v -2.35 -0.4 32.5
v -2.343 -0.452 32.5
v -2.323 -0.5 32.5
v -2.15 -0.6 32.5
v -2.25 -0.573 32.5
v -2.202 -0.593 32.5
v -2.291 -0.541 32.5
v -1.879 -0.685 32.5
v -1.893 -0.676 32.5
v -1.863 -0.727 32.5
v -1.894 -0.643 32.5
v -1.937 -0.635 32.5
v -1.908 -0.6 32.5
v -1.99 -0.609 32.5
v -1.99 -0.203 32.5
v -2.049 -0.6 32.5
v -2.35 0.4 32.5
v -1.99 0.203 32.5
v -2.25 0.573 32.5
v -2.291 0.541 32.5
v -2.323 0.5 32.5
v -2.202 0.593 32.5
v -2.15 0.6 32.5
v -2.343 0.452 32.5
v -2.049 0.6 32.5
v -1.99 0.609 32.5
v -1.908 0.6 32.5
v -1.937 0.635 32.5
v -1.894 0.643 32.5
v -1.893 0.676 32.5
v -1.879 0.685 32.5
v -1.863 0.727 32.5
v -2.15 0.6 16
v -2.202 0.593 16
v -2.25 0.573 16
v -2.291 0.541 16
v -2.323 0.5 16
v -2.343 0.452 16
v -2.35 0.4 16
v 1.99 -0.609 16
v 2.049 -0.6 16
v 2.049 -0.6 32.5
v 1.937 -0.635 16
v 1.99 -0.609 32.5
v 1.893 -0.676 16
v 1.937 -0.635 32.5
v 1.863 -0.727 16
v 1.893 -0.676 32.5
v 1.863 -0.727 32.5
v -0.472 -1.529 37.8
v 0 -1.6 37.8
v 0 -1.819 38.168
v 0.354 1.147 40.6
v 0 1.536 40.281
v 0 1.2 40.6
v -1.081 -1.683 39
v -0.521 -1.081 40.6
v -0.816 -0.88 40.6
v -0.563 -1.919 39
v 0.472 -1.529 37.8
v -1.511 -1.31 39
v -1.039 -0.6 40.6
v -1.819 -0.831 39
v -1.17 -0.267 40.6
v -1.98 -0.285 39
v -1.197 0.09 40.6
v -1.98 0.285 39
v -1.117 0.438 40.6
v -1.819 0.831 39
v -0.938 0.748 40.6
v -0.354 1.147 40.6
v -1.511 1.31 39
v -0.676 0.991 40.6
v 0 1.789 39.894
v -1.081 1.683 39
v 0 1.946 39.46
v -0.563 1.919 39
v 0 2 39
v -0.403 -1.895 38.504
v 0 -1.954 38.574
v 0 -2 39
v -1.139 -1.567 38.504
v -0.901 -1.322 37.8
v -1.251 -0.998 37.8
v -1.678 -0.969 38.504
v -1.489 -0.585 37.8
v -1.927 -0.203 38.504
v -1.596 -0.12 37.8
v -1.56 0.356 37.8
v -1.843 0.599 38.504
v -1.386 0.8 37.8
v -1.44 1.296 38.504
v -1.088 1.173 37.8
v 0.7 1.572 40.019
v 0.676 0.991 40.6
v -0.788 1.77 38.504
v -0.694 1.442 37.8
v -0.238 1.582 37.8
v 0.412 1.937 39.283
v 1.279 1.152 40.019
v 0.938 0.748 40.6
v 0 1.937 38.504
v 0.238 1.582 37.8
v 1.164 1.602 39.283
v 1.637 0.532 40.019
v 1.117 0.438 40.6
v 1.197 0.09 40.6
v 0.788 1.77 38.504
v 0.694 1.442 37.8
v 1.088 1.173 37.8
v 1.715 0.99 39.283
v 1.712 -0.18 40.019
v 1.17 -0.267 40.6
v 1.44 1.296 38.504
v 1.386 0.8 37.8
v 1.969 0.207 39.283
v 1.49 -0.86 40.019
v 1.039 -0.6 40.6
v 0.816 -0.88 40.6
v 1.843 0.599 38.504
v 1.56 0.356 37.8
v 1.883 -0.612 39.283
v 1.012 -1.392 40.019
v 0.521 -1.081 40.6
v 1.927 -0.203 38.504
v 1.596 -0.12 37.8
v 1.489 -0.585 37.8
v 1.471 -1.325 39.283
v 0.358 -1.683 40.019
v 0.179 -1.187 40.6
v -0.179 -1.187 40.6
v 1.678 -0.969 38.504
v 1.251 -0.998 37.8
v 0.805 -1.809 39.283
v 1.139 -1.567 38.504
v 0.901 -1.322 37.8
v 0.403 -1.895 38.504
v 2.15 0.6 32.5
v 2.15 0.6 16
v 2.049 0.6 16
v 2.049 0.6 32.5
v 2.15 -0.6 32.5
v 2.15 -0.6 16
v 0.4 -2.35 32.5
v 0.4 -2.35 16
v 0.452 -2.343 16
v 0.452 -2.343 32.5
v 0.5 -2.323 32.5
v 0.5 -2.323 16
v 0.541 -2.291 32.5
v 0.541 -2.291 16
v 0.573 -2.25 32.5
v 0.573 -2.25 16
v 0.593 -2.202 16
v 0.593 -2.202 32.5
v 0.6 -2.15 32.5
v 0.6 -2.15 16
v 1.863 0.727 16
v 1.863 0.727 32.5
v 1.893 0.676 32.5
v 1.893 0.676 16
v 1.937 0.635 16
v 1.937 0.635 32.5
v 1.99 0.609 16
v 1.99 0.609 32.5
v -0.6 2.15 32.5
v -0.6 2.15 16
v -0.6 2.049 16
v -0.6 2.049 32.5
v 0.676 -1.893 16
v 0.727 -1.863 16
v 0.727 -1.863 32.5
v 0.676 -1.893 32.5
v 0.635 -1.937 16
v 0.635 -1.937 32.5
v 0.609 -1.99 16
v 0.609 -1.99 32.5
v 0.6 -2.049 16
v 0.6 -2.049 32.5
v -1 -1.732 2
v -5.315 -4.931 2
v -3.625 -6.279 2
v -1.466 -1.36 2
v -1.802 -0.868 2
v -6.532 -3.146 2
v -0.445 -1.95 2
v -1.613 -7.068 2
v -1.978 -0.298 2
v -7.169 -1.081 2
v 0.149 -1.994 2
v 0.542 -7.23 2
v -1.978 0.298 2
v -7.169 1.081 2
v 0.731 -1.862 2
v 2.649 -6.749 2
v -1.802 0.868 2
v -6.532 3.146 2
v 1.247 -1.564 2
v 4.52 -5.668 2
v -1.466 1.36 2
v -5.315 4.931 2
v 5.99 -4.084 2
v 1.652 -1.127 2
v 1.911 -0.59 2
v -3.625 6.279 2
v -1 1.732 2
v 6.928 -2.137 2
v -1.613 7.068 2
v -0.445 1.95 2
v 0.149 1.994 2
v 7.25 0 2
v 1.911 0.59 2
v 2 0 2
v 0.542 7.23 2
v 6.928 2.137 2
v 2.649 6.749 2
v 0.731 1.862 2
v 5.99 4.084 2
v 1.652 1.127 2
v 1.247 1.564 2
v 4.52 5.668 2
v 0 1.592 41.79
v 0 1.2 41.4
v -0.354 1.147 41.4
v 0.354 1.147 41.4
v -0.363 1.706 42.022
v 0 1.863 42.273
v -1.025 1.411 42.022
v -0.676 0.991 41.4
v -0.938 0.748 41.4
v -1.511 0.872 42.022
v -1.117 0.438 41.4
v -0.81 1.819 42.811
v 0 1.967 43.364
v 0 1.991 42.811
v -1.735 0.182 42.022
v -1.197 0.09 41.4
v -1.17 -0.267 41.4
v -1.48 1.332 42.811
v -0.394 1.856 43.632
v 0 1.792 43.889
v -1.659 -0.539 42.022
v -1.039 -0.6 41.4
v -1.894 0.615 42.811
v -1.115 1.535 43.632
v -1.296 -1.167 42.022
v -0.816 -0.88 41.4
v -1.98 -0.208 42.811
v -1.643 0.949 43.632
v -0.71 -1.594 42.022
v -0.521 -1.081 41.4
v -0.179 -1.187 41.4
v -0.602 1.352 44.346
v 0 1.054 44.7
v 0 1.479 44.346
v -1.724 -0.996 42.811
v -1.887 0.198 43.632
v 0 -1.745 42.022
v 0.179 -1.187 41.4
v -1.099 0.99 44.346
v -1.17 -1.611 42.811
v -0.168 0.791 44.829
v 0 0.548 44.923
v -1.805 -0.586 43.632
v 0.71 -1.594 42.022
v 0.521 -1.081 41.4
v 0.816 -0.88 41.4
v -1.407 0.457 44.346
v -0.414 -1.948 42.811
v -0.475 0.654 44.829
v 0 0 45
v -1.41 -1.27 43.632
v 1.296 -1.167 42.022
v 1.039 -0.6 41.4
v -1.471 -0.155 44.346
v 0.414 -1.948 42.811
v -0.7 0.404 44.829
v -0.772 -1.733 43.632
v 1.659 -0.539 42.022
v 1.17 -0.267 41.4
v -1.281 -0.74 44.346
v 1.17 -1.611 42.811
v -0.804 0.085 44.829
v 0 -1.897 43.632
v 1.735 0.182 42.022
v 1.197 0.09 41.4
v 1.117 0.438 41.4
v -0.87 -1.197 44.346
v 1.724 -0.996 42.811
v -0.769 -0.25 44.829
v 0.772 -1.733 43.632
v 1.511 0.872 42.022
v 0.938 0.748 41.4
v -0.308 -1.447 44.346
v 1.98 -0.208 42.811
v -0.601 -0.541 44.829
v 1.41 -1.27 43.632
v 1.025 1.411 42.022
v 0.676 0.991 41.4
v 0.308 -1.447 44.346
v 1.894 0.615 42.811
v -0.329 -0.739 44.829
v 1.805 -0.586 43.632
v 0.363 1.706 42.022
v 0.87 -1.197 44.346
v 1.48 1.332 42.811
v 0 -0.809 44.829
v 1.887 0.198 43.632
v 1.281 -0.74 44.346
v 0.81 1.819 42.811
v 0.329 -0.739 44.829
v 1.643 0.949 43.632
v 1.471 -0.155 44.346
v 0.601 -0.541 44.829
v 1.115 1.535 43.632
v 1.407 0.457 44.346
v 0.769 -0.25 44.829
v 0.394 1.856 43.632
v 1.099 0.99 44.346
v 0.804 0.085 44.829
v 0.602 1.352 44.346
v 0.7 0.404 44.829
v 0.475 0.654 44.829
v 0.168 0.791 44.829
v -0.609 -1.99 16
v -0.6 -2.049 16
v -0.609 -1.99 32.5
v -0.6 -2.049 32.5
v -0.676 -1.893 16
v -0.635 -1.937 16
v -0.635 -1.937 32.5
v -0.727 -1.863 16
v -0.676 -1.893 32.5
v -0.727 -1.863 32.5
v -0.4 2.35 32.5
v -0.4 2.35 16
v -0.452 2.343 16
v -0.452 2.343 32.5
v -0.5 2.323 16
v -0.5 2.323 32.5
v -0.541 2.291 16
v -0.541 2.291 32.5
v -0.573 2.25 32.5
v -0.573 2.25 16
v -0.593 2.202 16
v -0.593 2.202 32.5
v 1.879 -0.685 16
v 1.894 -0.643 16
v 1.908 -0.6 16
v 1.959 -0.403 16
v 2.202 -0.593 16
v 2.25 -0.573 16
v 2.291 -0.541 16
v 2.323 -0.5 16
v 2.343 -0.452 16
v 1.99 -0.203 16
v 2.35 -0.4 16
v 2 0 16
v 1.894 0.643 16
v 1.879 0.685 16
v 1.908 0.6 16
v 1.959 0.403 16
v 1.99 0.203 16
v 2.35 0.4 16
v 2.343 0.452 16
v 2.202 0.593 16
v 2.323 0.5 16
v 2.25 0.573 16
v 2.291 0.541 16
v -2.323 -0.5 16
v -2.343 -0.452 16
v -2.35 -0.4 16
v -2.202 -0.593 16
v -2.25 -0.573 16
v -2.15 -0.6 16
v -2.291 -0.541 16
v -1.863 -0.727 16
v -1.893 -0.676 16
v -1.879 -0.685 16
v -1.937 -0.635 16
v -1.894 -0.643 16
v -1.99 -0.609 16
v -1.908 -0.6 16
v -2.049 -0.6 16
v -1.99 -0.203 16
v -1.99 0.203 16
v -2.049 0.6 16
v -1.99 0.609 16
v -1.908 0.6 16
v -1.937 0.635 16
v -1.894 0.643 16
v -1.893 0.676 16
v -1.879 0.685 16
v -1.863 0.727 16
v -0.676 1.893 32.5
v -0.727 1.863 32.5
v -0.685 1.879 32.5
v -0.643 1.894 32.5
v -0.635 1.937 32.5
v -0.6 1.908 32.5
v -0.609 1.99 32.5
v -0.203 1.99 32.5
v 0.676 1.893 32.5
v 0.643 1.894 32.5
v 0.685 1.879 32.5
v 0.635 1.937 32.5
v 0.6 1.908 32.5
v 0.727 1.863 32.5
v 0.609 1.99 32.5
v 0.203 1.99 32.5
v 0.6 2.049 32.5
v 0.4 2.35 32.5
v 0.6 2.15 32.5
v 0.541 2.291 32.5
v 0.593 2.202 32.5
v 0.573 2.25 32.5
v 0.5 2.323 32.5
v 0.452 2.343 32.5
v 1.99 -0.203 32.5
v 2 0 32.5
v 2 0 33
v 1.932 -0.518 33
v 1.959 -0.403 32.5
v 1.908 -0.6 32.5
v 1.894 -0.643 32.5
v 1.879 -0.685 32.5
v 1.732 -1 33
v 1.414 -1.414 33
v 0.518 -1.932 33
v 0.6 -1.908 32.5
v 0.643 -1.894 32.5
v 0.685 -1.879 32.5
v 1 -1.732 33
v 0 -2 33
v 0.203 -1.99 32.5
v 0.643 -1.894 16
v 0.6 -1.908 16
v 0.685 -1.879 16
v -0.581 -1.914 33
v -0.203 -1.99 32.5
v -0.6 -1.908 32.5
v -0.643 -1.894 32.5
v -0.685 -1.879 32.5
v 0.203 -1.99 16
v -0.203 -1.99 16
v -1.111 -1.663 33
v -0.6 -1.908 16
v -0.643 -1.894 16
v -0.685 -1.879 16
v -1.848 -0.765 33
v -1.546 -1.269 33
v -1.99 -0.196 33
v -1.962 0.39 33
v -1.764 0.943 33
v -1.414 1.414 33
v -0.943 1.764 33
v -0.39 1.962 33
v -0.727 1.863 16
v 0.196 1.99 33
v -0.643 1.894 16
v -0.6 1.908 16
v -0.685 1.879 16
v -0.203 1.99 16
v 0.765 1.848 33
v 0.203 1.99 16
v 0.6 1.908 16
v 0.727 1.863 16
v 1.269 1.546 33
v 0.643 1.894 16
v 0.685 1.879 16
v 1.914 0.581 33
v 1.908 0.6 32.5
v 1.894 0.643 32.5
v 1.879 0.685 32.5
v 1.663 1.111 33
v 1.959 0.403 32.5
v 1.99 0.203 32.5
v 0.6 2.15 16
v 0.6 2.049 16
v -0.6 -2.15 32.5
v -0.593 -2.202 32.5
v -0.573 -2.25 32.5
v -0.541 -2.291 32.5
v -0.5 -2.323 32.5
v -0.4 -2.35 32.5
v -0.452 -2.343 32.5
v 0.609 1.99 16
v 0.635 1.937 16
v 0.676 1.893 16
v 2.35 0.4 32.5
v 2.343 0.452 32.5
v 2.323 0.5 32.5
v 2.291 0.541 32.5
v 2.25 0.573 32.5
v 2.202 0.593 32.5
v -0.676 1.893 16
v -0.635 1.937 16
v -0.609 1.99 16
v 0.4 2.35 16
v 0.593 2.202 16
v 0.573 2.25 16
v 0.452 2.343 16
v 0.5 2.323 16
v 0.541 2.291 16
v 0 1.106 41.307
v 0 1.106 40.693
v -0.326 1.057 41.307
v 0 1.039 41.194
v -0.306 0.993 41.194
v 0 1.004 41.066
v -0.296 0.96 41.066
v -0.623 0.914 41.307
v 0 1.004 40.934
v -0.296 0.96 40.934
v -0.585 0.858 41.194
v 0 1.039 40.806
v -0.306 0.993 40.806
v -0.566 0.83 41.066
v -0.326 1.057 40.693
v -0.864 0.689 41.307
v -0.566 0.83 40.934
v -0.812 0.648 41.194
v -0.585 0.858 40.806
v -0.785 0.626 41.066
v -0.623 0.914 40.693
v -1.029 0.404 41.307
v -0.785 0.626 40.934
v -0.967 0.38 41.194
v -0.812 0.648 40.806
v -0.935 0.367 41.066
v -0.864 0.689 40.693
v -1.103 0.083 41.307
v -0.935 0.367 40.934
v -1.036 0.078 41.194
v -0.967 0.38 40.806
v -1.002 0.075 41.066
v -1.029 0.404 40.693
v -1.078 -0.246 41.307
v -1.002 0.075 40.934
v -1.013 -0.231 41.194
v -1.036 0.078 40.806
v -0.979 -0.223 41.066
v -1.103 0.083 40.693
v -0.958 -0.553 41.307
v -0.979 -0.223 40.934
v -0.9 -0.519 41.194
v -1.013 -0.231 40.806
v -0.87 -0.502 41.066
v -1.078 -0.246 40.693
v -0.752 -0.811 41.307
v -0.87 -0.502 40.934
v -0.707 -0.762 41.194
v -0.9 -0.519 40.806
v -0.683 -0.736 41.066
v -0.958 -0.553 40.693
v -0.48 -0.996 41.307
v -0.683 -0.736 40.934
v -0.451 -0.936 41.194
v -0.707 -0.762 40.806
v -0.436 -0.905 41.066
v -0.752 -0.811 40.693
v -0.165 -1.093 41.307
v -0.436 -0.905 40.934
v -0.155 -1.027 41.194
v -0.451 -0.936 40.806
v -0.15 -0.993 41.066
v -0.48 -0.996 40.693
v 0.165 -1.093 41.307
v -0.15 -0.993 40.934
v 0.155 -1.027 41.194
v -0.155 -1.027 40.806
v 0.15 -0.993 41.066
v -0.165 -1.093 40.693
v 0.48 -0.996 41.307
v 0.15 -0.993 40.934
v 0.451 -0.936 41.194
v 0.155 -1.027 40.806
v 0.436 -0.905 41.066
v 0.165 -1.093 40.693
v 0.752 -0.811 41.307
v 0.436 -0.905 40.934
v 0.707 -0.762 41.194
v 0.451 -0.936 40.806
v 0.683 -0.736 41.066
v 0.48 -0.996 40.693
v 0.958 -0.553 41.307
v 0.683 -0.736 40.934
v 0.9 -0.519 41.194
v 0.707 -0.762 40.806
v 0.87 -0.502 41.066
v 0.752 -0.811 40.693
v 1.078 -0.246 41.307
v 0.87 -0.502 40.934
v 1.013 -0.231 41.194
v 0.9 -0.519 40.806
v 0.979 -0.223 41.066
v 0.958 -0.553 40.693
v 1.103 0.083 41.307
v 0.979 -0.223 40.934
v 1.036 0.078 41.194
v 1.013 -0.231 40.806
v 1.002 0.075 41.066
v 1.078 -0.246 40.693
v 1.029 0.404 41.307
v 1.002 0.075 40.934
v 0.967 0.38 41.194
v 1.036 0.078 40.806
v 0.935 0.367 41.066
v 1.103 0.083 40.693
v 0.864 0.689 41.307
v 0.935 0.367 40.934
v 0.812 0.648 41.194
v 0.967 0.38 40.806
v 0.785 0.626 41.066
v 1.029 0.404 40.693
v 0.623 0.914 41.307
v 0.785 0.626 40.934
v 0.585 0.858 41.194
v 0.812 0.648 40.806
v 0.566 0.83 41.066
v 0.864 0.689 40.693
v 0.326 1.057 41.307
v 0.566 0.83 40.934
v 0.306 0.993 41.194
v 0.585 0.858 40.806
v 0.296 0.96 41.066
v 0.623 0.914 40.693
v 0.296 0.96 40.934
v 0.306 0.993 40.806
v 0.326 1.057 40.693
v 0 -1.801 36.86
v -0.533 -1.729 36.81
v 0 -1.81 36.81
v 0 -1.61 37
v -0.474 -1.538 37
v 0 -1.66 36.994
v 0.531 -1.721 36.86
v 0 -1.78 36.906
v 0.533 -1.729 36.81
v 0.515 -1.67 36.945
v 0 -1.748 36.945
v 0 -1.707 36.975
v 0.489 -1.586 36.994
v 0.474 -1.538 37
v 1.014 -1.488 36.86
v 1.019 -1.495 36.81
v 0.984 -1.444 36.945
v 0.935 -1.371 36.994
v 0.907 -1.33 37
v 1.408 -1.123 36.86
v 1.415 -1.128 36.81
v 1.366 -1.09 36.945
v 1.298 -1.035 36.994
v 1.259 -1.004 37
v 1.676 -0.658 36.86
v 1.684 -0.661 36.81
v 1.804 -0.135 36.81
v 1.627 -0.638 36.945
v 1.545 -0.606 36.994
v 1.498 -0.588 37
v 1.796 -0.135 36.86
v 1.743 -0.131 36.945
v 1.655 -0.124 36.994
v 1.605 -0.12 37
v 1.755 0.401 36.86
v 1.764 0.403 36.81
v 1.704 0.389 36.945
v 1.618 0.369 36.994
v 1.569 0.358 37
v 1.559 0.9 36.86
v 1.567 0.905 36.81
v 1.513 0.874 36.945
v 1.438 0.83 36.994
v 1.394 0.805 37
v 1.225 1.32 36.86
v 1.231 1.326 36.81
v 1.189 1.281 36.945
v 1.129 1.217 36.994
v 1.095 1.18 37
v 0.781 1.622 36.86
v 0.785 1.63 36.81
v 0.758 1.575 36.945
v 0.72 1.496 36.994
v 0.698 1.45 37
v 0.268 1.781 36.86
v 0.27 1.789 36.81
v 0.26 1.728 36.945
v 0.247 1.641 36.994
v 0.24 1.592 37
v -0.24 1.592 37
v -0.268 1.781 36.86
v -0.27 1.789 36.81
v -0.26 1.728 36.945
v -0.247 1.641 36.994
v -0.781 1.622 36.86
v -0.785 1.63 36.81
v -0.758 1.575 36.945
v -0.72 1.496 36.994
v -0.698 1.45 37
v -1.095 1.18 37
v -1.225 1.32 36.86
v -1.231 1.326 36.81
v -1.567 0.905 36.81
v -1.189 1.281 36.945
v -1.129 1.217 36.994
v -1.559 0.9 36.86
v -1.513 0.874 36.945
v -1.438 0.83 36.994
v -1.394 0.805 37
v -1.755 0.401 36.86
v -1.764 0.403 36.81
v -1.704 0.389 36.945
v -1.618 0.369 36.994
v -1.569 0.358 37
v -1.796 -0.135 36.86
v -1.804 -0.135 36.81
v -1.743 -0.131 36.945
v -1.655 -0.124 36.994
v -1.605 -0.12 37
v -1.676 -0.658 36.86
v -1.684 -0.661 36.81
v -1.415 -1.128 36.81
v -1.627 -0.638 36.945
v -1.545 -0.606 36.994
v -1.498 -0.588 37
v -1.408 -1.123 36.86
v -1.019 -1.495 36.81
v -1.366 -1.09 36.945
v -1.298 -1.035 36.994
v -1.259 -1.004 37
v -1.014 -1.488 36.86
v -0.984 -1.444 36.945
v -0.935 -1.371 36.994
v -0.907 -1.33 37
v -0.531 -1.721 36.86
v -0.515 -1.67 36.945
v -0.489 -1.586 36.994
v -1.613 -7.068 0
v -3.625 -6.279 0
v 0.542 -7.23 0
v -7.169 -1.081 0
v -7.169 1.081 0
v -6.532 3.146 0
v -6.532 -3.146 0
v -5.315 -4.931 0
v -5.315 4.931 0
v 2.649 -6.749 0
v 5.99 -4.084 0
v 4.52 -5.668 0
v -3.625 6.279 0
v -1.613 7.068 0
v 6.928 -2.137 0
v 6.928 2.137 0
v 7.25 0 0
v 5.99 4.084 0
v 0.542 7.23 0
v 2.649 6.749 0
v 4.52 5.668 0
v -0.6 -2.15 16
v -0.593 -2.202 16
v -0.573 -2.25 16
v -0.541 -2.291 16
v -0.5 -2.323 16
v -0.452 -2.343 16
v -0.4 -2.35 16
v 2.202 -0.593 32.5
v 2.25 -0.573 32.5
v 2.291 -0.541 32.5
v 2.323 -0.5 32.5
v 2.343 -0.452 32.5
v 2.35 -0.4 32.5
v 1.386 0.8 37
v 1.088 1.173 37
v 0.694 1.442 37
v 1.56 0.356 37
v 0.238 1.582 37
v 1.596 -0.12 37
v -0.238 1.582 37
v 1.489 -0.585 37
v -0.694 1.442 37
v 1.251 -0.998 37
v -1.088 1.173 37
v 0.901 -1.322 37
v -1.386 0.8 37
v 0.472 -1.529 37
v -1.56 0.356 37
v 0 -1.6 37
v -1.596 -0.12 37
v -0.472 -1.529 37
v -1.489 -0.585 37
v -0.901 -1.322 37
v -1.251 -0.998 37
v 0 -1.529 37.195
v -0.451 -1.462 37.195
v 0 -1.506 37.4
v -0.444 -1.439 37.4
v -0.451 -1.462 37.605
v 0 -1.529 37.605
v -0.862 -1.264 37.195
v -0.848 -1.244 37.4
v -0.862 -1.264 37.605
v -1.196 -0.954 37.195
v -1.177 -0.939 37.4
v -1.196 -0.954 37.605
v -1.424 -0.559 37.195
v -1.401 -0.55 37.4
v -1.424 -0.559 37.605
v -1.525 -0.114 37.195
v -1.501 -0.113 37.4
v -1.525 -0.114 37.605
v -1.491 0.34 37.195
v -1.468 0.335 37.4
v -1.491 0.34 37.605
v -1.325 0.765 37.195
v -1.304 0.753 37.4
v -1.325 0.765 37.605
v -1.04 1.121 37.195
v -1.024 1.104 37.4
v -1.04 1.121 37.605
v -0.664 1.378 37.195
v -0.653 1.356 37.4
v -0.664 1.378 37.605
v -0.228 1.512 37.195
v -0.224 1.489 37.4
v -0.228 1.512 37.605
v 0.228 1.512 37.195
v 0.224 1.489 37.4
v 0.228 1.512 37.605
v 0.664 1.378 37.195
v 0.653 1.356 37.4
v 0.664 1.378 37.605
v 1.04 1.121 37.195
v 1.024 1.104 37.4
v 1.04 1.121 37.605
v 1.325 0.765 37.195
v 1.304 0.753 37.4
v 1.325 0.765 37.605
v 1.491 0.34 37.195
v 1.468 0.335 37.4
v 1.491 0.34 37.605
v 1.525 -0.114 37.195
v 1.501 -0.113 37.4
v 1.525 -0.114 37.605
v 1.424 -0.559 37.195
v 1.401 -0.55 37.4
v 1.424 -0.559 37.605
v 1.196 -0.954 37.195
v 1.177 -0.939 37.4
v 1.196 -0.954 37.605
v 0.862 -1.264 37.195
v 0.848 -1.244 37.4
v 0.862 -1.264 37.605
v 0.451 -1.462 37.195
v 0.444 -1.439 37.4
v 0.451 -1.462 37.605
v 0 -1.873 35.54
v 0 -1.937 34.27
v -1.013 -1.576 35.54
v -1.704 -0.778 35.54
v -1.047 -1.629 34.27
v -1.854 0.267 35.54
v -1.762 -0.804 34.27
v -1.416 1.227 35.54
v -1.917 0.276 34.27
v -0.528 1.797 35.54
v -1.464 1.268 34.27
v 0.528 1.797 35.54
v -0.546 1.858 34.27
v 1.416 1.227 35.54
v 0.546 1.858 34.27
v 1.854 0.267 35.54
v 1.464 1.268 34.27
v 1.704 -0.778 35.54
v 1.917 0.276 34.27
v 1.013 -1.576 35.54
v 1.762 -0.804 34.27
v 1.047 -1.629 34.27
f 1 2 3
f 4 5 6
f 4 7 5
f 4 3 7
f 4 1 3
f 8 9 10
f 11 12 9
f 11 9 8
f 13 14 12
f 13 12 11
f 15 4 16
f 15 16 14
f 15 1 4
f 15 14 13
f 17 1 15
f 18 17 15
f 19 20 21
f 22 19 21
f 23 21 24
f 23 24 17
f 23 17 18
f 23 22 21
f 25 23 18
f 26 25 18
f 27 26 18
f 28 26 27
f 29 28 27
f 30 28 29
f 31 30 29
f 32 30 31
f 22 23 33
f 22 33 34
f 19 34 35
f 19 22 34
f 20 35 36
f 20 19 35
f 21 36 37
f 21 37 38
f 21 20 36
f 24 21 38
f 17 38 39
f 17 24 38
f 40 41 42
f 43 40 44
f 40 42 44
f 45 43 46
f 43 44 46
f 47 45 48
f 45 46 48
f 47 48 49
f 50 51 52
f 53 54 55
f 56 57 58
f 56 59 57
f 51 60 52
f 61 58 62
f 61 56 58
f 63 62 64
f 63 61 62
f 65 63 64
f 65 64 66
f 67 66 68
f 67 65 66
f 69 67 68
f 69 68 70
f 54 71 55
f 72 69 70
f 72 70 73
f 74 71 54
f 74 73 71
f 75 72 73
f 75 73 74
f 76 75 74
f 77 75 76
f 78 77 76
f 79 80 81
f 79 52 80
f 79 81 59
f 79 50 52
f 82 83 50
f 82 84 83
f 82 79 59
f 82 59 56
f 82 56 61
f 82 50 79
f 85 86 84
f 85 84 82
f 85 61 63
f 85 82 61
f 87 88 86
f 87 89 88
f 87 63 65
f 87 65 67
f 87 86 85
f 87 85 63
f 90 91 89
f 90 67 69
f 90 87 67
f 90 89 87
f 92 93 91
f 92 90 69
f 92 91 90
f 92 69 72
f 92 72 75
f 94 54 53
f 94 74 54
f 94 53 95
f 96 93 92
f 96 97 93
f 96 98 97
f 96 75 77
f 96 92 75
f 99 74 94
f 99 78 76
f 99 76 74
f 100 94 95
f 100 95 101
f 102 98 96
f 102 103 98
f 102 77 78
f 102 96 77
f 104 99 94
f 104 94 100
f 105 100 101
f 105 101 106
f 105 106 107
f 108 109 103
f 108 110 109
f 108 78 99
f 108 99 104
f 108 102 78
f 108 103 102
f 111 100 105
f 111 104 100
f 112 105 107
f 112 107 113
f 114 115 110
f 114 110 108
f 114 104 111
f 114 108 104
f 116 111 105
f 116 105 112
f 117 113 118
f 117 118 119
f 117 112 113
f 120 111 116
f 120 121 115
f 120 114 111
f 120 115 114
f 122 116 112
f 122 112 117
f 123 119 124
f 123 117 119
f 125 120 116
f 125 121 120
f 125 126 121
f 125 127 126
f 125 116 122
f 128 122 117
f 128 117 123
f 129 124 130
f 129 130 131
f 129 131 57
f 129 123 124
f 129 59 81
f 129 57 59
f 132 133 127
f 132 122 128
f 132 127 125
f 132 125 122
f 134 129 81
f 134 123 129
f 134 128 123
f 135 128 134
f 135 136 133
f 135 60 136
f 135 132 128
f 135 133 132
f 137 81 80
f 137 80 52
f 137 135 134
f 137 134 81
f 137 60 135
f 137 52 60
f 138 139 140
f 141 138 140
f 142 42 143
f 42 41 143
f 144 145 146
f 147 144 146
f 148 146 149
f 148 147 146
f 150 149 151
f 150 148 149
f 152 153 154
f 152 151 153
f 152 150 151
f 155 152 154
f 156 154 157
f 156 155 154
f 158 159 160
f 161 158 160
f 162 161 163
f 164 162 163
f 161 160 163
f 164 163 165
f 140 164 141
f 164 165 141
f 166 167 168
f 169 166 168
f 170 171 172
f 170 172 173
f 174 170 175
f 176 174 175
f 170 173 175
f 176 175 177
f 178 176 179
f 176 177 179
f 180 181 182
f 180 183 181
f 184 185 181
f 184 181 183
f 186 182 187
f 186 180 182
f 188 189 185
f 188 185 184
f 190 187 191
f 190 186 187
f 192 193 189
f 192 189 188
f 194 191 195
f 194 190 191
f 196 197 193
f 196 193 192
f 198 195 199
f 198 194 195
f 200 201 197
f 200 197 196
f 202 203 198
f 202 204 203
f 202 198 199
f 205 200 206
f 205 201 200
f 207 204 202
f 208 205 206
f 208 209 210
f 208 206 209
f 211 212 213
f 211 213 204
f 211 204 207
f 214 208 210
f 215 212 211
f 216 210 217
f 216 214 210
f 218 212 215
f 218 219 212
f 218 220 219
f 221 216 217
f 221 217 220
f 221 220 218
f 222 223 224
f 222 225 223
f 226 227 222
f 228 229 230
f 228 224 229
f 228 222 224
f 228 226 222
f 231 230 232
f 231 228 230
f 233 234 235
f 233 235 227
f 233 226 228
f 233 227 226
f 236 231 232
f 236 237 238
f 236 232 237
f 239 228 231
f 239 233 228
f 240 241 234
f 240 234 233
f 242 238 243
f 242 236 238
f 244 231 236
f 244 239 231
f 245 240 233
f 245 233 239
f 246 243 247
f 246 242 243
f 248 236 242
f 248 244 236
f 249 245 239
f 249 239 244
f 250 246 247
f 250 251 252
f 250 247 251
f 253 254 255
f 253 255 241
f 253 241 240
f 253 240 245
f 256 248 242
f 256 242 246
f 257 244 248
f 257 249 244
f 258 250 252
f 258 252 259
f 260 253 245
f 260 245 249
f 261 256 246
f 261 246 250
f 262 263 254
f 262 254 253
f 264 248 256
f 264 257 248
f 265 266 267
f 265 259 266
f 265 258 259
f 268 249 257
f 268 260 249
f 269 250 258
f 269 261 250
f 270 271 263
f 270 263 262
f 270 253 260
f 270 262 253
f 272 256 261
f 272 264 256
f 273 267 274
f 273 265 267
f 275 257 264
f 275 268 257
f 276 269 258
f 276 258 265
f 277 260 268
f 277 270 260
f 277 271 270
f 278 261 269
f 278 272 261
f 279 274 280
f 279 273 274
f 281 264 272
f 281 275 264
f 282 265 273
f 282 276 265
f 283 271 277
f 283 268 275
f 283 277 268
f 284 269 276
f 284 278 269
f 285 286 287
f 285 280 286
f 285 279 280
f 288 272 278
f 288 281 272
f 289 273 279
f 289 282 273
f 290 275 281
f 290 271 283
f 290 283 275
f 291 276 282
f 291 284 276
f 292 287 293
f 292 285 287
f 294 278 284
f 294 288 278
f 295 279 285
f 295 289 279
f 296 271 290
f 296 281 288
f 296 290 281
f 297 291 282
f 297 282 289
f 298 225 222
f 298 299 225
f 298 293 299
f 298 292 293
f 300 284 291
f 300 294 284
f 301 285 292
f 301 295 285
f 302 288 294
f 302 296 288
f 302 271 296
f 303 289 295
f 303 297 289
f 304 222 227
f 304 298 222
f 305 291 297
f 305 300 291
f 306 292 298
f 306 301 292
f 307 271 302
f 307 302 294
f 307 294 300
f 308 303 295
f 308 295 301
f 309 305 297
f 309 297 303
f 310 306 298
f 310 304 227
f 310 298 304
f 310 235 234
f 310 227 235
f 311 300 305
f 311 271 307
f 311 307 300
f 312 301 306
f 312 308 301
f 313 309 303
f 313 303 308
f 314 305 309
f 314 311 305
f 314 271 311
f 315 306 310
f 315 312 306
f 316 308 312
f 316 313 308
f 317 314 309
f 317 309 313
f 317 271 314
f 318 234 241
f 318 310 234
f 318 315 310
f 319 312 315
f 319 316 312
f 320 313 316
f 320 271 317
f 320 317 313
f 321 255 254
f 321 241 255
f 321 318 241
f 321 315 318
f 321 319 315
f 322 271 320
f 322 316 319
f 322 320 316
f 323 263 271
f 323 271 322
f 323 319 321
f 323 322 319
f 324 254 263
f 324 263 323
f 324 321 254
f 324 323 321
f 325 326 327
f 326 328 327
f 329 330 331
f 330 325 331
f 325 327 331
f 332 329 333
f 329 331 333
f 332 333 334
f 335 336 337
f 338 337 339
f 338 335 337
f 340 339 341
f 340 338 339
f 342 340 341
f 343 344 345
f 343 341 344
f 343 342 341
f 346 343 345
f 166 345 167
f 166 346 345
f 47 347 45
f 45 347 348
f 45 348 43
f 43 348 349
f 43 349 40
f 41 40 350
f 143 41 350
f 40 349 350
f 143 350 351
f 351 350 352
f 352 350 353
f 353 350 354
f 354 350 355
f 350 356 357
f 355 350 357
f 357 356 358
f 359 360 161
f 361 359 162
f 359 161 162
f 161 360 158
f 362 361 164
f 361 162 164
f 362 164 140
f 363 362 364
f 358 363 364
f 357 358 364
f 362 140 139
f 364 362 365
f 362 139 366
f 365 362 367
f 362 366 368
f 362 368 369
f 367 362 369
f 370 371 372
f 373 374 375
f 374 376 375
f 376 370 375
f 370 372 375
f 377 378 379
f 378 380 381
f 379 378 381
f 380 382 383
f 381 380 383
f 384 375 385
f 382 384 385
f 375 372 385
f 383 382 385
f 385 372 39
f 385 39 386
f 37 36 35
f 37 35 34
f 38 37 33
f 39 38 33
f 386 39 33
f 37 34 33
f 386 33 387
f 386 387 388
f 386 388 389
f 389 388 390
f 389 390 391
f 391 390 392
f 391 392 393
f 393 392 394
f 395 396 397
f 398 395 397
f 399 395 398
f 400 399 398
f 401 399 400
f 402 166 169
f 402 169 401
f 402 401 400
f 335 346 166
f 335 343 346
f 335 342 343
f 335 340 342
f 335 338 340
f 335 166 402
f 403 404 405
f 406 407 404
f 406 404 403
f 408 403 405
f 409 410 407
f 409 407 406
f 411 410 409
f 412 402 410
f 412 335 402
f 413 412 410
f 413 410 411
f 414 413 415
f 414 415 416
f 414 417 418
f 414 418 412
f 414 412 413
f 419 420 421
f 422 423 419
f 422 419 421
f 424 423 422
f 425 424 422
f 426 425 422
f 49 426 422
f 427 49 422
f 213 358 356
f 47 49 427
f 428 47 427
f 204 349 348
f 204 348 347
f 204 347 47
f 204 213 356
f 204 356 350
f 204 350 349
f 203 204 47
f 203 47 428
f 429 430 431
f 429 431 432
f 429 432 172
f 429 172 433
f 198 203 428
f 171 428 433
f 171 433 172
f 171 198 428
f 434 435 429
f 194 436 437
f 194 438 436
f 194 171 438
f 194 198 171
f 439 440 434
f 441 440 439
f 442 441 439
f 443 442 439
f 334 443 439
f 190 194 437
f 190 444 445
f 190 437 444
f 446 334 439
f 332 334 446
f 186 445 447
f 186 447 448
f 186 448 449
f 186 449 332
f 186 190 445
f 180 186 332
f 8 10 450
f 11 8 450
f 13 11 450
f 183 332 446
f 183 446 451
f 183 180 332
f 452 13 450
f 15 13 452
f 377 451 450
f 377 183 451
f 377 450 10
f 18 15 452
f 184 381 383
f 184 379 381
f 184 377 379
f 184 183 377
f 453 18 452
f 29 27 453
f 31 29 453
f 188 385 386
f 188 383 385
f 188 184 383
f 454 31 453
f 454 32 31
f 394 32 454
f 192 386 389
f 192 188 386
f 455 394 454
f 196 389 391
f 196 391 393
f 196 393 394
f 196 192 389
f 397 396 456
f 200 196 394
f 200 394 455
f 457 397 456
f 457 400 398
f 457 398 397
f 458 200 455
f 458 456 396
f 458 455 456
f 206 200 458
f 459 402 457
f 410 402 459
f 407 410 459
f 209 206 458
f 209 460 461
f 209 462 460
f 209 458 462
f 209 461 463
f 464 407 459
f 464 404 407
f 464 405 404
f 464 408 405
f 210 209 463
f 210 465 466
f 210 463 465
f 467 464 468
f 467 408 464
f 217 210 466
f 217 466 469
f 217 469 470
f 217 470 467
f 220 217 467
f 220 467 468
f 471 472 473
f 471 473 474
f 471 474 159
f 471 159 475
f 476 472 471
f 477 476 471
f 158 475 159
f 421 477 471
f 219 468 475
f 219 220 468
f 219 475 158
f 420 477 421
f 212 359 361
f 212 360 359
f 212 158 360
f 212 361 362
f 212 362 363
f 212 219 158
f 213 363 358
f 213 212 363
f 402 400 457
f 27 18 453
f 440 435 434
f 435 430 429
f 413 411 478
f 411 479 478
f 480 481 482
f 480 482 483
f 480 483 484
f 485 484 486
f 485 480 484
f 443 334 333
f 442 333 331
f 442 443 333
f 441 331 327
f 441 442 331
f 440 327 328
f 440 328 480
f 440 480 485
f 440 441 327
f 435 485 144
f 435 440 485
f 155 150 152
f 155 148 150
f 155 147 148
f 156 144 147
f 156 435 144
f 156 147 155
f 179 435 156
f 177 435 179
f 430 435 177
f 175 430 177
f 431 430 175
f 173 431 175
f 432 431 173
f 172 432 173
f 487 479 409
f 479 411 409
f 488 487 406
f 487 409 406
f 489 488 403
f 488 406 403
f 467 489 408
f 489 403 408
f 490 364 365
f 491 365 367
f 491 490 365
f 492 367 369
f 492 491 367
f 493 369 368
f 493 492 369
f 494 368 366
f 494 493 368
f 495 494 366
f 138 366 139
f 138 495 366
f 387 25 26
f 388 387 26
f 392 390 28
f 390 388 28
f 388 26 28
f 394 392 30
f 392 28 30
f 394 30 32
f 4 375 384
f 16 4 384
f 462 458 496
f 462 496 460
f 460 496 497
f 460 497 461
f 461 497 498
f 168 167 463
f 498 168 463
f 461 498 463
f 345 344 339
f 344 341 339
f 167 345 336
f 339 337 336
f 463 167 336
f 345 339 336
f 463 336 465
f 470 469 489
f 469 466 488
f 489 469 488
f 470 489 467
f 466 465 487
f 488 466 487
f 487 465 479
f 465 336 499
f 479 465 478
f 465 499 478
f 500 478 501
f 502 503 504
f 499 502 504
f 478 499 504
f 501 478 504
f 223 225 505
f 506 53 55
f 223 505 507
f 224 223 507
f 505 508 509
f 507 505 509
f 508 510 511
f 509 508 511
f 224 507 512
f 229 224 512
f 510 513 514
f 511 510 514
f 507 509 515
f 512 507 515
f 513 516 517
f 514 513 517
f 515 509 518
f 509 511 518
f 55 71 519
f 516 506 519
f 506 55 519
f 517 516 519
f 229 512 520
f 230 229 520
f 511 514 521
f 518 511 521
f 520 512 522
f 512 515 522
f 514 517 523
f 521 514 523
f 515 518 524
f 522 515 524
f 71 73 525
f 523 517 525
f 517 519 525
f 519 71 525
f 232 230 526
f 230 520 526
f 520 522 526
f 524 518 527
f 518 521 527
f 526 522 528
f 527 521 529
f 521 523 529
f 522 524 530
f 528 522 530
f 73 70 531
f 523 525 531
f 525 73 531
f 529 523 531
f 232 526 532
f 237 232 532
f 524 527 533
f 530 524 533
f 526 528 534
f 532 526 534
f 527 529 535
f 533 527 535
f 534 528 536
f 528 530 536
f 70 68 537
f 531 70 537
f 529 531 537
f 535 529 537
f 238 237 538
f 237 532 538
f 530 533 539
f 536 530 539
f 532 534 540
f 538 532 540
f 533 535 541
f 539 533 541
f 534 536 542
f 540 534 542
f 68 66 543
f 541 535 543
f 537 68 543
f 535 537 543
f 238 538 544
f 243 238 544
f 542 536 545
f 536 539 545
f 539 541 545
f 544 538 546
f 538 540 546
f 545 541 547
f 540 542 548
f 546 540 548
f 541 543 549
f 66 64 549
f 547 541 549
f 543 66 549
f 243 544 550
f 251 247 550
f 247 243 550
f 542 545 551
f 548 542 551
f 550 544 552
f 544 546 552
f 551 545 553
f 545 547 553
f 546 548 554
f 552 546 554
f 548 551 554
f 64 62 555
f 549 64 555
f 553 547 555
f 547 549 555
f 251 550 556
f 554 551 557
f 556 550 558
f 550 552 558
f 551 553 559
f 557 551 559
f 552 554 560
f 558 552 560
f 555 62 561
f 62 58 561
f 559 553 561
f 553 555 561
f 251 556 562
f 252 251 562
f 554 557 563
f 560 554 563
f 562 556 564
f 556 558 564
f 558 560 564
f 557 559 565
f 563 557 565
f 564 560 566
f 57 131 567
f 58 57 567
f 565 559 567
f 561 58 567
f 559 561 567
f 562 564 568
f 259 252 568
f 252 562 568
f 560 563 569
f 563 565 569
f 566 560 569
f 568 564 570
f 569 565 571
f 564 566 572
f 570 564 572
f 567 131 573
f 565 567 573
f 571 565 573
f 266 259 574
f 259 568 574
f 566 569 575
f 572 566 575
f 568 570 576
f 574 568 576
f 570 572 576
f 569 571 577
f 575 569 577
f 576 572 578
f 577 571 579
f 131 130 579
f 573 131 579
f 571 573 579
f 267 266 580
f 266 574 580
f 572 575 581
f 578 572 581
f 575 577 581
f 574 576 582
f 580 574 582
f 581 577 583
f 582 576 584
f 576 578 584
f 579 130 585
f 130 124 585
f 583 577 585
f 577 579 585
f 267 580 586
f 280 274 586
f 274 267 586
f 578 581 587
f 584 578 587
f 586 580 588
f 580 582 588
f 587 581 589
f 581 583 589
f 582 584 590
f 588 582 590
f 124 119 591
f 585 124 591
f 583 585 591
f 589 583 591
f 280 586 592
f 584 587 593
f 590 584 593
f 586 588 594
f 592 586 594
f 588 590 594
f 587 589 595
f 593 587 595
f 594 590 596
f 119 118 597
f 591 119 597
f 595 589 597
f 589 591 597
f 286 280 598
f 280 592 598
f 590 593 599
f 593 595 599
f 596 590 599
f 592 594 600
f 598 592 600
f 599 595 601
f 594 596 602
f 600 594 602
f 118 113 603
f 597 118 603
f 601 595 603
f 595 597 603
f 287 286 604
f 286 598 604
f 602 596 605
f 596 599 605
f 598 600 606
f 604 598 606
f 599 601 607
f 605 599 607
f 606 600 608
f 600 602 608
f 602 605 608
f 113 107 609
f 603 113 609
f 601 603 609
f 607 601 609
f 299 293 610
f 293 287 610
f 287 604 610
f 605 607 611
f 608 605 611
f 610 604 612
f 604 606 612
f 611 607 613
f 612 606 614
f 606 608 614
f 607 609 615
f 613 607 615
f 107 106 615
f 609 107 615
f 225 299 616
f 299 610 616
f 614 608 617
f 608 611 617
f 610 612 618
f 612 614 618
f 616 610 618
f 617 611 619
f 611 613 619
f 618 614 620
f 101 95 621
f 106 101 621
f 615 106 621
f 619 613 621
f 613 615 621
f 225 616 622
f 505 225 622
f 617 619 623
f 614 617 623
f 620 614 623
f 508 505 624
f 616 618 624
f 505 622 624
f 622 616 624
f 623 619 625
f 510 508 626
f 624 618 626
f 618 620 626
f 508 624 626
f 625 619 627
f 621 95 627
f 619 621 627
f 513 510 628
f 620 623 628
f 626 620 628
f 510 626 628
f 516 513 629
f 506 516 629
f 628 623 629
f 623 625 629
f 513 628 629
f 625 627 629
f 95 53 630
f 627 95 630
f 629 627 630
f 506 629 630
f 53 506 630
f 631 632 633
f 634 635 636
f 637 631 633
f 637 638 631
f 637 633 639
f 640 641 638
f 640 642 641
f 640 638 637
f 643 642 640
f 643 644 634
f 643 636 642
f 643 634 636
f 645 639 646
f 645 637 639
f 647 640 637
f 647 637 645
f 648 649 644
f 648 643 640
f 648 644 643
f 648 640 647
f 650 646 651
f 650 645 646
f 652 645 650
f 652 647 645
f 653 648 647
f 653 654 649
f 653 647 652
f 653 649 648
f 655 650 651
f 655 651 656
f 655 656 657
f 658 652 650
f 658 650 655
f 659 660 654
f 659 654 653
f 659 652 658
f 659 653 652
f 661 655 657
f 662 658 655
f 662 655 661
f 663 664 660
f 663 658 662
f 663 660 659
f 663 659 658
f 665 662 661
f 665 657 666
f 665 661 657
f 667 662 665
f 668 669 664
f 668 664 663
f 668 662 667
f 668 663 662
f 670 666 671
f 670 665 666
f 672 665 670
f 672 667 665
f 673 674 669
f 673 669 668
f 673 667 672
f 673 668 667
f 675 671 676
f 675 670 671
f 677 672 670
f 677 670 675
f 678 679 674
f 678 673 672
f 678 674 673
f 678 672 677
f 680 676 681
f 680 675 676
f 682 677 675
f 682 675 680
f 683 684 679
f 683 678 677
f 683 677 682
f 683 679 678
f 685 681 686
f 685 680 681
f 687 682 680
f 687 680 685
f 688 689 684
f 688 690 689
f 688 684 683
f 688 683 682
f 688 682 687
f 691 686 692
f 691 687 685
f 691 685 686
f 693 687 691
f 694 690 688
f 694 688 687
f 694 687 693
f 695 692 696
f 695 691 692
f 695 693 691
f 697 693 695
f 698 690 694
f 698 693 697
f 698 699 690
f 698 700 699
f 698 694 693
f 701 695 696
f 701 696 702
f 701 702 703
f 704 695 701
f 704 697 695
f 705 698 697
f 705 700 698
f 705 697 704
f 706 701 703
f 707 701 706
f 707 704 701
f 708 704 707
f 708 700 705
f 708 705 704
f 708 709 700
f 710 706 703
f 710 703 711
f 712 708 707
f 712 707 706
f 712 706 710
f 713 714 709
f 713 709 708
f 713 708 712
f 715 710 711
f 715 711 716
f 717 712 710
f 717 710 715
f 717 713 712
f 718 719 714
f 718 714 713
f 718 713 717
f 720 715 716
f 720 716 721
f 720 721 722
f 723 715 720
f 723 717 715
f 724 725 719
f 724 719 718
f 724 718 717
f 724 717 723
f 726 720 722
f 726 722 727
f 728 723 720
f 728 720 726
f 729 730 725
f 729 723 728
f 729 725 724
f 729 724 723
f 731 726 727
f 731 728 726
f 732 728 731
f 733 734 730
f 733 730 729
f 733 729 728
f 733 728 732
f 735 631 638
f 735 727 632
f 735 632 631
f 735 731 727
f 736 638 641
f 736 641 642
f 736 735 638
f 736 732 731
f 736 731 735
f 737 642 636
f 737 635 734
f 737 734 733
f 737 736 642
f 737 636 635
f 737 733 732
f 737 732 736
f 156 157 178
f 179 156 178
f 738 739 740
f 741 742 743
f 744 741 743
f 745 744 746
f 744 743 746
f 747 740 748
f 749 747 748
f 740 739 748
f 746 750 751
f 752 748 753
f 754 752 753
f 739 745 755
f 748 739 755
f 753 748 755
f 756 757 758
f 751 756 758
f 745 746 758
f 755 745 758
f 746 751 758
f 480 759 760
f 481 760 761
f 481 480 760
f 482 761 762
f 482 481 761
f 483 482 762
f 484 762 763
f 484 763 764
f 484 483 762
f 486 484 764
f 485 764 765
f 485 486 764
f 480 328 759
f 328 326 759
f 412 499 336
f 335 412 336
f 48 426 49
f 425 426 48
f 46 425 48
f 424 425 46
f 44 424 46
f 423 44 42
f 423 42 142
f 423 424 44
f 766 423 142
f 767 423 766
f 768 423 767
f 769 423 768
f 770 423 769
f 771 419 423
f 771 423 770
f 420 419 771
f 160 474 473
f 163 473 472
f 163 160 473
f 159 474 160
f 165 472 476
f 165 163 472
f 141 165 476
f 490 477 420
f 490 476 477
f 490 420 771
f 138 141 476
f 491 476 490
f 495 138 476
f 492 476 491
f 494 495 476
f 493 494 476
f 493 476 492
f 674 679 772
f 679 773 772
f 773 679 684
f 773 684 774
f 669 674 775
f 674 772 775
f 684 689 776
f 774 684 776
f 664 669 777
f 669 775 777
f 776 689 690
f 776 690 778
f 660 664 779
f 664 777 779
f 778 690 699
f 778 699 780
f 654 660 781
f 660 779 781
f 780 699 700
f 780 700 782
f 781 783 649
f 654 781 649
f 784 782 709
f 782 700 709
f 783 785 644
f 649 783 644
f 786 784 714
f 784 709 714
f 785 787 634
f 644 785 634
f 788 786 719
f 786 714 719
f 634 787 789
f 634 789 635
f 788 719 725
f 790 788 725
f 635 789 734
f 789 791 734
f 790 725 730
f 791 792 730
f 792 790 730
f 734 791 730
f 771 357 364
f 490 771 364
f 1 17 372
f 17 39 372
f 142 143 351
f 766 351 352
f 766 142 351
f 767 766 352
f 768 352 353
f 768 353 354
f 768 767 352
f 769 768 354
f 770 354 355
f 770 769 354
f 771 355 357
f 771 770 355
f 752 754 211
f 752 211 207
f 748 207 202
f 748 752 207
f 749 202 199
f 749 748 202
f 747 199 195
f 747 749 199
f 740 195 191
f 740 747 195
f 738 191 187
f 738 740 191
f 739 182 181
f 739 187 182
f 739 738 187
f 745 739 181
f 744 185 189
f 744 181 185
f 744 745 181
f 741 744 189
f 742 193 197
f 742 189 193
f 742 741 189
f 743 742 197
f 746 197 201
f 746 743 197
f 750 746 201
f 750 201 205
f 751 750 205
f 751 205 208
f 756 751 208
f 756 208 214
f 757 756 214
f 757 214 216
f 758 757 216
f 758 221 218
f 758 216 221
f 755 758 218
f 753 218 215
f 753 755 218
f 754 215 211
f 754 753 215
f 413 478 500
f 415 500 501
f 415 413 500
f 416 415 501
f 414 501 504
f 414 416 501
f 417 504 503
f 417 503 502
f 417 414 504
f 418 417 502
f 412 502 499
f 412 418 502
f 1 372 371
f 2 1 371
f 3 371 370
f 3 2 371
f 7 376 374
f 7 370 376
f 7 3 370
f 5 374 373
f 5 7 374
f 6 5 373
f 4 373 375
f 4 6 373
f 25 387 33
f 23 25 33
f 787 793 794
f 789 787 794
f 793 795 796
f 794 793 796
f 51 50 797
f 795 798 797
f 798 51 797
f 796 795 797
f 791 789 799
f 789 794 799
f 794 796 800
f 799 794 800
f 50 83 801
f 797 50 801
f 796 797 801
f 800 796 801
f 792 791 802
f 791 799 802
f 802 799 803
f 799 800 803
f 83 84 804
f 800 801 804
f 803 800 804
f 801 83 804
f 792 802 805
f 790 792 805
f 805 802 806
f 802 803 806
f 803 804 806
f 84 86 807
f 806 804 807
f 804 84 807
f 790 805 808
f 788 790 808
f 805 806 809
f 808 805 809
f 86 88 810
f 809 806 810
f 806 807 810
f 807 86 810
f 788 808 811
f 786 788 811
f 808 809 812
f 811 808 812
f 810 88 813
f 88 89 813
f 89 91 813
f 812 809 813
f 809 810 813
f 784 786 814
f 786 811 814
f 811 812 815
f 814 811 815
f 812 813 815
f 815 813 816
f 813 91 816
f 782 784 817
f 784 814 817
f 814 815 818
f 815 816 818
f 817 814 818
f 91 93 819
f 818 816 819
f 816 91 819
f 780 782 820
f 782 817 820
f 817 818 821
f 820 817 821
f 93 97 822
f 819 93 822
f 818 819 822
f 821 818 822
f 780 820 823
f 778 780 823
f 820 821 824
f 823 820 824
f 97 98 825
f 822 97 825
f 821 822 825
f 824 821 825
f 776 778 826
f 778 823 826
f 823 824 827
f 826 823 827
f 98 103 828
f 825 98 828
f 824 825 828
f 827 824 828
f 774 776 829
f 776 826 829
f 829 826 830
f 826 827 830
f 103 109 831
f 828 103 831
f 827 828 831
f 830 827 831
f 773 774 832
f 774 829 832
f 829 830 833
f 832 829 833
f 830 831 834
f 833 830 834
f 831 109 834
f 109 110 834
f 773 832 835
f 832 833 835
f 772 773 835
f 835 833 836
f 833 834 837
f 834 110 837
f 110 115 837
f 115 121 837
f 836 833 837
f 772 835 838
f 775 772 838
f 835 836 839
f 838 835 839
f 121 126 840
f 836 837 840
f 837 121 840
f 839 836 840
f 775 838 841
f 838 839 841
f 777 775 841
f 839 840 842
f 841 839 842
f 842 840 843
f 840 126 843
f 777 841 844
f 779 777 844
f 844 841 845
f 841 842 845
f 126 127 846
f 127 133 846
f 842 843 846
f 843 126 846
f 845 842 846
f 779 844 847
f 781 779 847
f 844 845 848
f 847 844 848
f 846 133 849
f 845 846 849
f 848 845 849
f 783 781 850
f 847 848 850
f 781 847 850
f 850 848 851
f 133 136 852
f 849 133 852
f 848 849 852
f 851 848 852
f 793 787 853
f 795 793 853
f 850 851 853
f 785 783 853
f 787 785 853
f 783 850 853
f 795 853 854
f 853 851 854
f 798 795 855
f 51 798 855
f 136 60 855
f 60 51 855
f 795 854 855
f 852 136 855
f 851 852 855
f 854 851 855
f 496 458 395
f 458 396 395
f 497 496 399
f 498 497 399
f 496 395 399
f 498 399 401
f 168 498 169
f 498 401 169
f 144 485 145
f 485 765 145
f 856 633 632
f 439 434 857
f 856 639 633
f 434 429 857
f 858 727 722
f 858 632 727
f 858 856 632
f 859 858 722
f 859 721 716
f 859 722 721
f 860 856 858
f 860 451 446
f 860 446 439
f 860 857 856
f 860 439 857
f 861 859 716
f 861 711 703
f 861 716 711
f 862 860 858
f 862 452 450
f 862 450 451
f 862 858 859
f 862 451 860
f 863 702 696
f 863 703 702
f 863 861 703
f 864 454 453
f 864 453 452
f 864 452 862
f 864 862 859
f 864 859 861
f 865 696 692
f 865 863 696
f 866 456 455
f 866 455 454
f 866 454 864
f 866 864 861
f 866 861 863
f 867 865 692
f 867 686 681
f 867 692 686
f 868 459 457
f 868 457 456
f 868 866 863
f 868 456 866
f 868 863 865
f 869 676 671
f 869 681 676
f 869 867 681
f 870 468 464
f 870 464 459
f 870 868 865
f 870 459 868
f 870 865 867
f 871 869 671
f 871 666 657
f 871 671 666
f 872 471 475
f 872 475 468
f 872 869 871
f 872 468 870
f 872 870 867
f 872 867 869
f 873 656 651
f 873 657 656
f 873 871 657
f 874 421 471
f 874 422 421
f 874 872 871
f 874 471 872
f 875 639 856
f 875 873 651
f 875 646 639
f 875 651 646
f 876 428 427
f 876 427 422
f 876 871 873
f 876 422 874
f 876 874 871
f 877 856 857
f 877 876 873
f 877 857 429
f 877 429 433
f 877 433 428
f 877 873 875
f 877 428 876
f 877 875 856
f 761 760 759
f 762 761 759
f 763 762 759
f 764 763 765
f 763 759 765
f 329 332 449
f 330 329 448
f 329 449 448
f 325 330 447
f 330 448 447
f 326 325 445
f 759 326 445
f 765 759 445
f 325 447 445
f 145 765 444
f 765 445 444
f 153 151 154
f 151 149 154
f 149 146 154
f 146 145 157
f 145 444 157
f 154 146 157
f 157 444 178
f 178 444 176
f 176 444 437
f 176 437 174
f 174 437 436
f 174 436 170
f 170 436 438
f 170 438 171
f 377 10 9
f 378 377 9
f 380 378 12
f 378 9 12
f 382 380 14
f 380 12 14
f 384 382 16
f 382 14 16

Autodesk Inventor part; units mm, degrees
ref_plane "YZ Plane" through (0, 0, 0) normal (1, 0, 0) x (0, 1, 0)
ref_plane "XZ Plane" through (0, 0, 0) normal (0, 1, 0) x (-1, 0, 0)
sketch "Boceto1" plane through (0, 0, 0) normal (0, 0, 1) x (1, 0, 0)
  circle A0 centre (0, 0) radius 7.25
  dimension "d0" = 14.5
extrude "Extrusión1" add sketch "Boceto1" along normal blind 2
sketch "Boceto2" plane through (0, 0, 2) normal (0, 0, 1) x (1, 0, 0)
  circle A0 centre (0, 0) radius 2
  dimension "d3" = 4
extrude "Extrusión2" add sketch "Boceto2" along normal blind 43
sketch "Boceto3" plane through (0, 0, 0) normal (1, 0, 0) x (0, 1, 0)
  line L0 (2, 45) -> (-2, 45) projected
  line L1 (-2, 2) -> (2, 2) projected
  line L2 (-2, 2) -> (-2, 45) projected
  line L3 (2, 45) -> (-2, 45)
  line L4 (-2, 45) -> (-2, 41)
  line L5 (2, 41) -> (2, 45)
  arc A0 (1.2, 41.4) -> (-1.2, 41.4) centre (0, 43) ccw
  line L6 (-2, 41) -> (-2, 37)
  line L7 (-1.8, 37) -> (1.8, 37)
  line L8 (2, 37) -> (2, 41)
  arc A1 (-1.2, 40.6) -> (1.2, 40.6) centre (0, 39) ccw
  line L9 (0, 45) -> (0, 0)
  arc A2 (1.2, 41.4) -> (1.2, 40.6) centre (1.5, 41) ccw
  arc A3 (-1.2, 40.6) -> (-1.2, 41.4) centre (-1.5, 41) ccw
  line L10 (2, 45) -> (-2, 45)
  line L11 (-2, 45) -> (-2, 37)
  line L12 (-1.8, 37) -> (1.8, 37)
  line L13 (2, 37) -> (2, 45)
  line L14 (1.8, 37) -> (1, 37)
  line L15 (-1.8, 37) -> (-1, 37)
  line L16 (0, 37) -> (1.6, 37)
  line L17 (2, 37) -> (2, 33)
  line L18 (0, 37) -> (1.8, 37)
  line L19 (1.8, 37) -> (2, 33)
  line L20 (0, 37) -> (-1.8, 37)
  line L21 (-1.8, 37) -> (-2, 33)
  arc A4 (1.6, 37.8) -> (1.6, 37) centre (2.4, 37.4) ccw
  arc A5 (-1.6, 37) -> (-1.6, 37.8) centre (-2.4, 37.4) ccw
  point P0 (-1.6, 37.8)
  point P1 (-2, 39)
  point P2 (2, 39)
  point P3 (2, 43)
  point P4 (0, 45)
  point P5 (-2, 43)
  dimension "d12" = 1.6
  dimension "d13" = 4
  dimension "d14" = 1.8
  dimension "d15" = 1.8
revolve "Revolución1" cut sketch "Boceto3" angle 360 about axis through (0, 0, 45) along (0, 0, -1) contours L5 A0 L0 | A0 L2 L0 | L5 L8 A1 A2 A0 | A0 A3 A1 L2 | A5 L7 L21 L2 A1 | A1 L8 L17 L19 L7 A4
fillet "Empalme1" radius 0.2 1 edges at (0, 1.8, 37)
ref_plane "Plano de trabajo1" through (0, 0, 16) normal (0, 0, 1) x (1, 0, 0)
sketch "Boceto4" plane through (0, 0, 16) normal (0, 0, 1) x (1, 0, 0)
  circle A0 centre (0, 0) radius 2 projected
  line L0 (0.6, 1.9079) -> (0.6, 2.35)
  line L1 (0.6, 2.35) -> (-0.6, 2.35)
  line L2 (-0.6, 2.35) -> (-0.6, 1.9079)
  line L3 (0, 2) -> (0.6, 2.35) construction
  line L4 (0, 2) -> (-0.6, 2.35) construction
  arc A1 (0.6, 1.9079) -> (-0.6, 1.9079) centre (0, 0) ccw
  line L5 (-2.35, 0.6) -> (-2.35, -0.6)
  line L6 (-2.35, -0.6) -> (-1.9079, -0.6)
  arc A2 (-1.9079, 0.6) -> (-1.9079, -0.6) centre (0, 0) ccw
  line L7 (-1.9079, 0.6) -> (-2.35, 0.6)
  line L8 (-0.6, -2.35) -> (0.6, -2.35)
  line L9 (0.6, -2.35) -> (0.6, -1.9079)
  arc A3 (-0.6, -1.9079) -> (0.6, -1.9079) centre (0, 0) ccw
  line L10 (-0.6, -1.9079) -> (-0.6, -2.35)
  line L11 (2.35, -0.6) -> (2.35, 0.6)
  line L12 (2.35, 0.6) -> (1.9079, 0.6)
  arc A4 (1.9079, -0.6) -> (1.9079, 0.6) centre (0, 0) ccw
  line L13 (1.9079, -0.6) -> (2.35, -0.6)
  point P0 (-2, 0)
  point P1 (0, -2)
  point P2 (2, 0)
  dimension "d20" = 1.2
  dimension "d24" = 360
extrude "Extrusión3" add sketch "Boceto4" along normal blind 16.5 contours A0 L12 L11 L13 | A0 L2 L1 L0 | L9 L8 L10 A0 | A0 L6 L5 L7
fillet "Empalme2" radius 0.2 16 edges at (-0.6, 2.35, 24.25) (0.6, 2.35, 24.25) (-0.6, 1.9079, 24.25) (0.6, 1.9079, 24.25) (1.9079, 0.6, 24.25) (2.35, 0.6, 24.25) (2.35, -0.6, 24.25) (1.9079, -0.6, 24.25) (0.6, -2.35, 24.25) (0.6, -1.9079, 24.25) (-0.6, -1.9079, 24.25) (-0.6, -2.35, 24.25) (-2.35, 0.6, 24.25) (-2.35, -0.6, 24.25) (-1.9079, -0.6, 24.25) (-1.9079, 0.6, 24.25)
properties material "Plástico ABS"
